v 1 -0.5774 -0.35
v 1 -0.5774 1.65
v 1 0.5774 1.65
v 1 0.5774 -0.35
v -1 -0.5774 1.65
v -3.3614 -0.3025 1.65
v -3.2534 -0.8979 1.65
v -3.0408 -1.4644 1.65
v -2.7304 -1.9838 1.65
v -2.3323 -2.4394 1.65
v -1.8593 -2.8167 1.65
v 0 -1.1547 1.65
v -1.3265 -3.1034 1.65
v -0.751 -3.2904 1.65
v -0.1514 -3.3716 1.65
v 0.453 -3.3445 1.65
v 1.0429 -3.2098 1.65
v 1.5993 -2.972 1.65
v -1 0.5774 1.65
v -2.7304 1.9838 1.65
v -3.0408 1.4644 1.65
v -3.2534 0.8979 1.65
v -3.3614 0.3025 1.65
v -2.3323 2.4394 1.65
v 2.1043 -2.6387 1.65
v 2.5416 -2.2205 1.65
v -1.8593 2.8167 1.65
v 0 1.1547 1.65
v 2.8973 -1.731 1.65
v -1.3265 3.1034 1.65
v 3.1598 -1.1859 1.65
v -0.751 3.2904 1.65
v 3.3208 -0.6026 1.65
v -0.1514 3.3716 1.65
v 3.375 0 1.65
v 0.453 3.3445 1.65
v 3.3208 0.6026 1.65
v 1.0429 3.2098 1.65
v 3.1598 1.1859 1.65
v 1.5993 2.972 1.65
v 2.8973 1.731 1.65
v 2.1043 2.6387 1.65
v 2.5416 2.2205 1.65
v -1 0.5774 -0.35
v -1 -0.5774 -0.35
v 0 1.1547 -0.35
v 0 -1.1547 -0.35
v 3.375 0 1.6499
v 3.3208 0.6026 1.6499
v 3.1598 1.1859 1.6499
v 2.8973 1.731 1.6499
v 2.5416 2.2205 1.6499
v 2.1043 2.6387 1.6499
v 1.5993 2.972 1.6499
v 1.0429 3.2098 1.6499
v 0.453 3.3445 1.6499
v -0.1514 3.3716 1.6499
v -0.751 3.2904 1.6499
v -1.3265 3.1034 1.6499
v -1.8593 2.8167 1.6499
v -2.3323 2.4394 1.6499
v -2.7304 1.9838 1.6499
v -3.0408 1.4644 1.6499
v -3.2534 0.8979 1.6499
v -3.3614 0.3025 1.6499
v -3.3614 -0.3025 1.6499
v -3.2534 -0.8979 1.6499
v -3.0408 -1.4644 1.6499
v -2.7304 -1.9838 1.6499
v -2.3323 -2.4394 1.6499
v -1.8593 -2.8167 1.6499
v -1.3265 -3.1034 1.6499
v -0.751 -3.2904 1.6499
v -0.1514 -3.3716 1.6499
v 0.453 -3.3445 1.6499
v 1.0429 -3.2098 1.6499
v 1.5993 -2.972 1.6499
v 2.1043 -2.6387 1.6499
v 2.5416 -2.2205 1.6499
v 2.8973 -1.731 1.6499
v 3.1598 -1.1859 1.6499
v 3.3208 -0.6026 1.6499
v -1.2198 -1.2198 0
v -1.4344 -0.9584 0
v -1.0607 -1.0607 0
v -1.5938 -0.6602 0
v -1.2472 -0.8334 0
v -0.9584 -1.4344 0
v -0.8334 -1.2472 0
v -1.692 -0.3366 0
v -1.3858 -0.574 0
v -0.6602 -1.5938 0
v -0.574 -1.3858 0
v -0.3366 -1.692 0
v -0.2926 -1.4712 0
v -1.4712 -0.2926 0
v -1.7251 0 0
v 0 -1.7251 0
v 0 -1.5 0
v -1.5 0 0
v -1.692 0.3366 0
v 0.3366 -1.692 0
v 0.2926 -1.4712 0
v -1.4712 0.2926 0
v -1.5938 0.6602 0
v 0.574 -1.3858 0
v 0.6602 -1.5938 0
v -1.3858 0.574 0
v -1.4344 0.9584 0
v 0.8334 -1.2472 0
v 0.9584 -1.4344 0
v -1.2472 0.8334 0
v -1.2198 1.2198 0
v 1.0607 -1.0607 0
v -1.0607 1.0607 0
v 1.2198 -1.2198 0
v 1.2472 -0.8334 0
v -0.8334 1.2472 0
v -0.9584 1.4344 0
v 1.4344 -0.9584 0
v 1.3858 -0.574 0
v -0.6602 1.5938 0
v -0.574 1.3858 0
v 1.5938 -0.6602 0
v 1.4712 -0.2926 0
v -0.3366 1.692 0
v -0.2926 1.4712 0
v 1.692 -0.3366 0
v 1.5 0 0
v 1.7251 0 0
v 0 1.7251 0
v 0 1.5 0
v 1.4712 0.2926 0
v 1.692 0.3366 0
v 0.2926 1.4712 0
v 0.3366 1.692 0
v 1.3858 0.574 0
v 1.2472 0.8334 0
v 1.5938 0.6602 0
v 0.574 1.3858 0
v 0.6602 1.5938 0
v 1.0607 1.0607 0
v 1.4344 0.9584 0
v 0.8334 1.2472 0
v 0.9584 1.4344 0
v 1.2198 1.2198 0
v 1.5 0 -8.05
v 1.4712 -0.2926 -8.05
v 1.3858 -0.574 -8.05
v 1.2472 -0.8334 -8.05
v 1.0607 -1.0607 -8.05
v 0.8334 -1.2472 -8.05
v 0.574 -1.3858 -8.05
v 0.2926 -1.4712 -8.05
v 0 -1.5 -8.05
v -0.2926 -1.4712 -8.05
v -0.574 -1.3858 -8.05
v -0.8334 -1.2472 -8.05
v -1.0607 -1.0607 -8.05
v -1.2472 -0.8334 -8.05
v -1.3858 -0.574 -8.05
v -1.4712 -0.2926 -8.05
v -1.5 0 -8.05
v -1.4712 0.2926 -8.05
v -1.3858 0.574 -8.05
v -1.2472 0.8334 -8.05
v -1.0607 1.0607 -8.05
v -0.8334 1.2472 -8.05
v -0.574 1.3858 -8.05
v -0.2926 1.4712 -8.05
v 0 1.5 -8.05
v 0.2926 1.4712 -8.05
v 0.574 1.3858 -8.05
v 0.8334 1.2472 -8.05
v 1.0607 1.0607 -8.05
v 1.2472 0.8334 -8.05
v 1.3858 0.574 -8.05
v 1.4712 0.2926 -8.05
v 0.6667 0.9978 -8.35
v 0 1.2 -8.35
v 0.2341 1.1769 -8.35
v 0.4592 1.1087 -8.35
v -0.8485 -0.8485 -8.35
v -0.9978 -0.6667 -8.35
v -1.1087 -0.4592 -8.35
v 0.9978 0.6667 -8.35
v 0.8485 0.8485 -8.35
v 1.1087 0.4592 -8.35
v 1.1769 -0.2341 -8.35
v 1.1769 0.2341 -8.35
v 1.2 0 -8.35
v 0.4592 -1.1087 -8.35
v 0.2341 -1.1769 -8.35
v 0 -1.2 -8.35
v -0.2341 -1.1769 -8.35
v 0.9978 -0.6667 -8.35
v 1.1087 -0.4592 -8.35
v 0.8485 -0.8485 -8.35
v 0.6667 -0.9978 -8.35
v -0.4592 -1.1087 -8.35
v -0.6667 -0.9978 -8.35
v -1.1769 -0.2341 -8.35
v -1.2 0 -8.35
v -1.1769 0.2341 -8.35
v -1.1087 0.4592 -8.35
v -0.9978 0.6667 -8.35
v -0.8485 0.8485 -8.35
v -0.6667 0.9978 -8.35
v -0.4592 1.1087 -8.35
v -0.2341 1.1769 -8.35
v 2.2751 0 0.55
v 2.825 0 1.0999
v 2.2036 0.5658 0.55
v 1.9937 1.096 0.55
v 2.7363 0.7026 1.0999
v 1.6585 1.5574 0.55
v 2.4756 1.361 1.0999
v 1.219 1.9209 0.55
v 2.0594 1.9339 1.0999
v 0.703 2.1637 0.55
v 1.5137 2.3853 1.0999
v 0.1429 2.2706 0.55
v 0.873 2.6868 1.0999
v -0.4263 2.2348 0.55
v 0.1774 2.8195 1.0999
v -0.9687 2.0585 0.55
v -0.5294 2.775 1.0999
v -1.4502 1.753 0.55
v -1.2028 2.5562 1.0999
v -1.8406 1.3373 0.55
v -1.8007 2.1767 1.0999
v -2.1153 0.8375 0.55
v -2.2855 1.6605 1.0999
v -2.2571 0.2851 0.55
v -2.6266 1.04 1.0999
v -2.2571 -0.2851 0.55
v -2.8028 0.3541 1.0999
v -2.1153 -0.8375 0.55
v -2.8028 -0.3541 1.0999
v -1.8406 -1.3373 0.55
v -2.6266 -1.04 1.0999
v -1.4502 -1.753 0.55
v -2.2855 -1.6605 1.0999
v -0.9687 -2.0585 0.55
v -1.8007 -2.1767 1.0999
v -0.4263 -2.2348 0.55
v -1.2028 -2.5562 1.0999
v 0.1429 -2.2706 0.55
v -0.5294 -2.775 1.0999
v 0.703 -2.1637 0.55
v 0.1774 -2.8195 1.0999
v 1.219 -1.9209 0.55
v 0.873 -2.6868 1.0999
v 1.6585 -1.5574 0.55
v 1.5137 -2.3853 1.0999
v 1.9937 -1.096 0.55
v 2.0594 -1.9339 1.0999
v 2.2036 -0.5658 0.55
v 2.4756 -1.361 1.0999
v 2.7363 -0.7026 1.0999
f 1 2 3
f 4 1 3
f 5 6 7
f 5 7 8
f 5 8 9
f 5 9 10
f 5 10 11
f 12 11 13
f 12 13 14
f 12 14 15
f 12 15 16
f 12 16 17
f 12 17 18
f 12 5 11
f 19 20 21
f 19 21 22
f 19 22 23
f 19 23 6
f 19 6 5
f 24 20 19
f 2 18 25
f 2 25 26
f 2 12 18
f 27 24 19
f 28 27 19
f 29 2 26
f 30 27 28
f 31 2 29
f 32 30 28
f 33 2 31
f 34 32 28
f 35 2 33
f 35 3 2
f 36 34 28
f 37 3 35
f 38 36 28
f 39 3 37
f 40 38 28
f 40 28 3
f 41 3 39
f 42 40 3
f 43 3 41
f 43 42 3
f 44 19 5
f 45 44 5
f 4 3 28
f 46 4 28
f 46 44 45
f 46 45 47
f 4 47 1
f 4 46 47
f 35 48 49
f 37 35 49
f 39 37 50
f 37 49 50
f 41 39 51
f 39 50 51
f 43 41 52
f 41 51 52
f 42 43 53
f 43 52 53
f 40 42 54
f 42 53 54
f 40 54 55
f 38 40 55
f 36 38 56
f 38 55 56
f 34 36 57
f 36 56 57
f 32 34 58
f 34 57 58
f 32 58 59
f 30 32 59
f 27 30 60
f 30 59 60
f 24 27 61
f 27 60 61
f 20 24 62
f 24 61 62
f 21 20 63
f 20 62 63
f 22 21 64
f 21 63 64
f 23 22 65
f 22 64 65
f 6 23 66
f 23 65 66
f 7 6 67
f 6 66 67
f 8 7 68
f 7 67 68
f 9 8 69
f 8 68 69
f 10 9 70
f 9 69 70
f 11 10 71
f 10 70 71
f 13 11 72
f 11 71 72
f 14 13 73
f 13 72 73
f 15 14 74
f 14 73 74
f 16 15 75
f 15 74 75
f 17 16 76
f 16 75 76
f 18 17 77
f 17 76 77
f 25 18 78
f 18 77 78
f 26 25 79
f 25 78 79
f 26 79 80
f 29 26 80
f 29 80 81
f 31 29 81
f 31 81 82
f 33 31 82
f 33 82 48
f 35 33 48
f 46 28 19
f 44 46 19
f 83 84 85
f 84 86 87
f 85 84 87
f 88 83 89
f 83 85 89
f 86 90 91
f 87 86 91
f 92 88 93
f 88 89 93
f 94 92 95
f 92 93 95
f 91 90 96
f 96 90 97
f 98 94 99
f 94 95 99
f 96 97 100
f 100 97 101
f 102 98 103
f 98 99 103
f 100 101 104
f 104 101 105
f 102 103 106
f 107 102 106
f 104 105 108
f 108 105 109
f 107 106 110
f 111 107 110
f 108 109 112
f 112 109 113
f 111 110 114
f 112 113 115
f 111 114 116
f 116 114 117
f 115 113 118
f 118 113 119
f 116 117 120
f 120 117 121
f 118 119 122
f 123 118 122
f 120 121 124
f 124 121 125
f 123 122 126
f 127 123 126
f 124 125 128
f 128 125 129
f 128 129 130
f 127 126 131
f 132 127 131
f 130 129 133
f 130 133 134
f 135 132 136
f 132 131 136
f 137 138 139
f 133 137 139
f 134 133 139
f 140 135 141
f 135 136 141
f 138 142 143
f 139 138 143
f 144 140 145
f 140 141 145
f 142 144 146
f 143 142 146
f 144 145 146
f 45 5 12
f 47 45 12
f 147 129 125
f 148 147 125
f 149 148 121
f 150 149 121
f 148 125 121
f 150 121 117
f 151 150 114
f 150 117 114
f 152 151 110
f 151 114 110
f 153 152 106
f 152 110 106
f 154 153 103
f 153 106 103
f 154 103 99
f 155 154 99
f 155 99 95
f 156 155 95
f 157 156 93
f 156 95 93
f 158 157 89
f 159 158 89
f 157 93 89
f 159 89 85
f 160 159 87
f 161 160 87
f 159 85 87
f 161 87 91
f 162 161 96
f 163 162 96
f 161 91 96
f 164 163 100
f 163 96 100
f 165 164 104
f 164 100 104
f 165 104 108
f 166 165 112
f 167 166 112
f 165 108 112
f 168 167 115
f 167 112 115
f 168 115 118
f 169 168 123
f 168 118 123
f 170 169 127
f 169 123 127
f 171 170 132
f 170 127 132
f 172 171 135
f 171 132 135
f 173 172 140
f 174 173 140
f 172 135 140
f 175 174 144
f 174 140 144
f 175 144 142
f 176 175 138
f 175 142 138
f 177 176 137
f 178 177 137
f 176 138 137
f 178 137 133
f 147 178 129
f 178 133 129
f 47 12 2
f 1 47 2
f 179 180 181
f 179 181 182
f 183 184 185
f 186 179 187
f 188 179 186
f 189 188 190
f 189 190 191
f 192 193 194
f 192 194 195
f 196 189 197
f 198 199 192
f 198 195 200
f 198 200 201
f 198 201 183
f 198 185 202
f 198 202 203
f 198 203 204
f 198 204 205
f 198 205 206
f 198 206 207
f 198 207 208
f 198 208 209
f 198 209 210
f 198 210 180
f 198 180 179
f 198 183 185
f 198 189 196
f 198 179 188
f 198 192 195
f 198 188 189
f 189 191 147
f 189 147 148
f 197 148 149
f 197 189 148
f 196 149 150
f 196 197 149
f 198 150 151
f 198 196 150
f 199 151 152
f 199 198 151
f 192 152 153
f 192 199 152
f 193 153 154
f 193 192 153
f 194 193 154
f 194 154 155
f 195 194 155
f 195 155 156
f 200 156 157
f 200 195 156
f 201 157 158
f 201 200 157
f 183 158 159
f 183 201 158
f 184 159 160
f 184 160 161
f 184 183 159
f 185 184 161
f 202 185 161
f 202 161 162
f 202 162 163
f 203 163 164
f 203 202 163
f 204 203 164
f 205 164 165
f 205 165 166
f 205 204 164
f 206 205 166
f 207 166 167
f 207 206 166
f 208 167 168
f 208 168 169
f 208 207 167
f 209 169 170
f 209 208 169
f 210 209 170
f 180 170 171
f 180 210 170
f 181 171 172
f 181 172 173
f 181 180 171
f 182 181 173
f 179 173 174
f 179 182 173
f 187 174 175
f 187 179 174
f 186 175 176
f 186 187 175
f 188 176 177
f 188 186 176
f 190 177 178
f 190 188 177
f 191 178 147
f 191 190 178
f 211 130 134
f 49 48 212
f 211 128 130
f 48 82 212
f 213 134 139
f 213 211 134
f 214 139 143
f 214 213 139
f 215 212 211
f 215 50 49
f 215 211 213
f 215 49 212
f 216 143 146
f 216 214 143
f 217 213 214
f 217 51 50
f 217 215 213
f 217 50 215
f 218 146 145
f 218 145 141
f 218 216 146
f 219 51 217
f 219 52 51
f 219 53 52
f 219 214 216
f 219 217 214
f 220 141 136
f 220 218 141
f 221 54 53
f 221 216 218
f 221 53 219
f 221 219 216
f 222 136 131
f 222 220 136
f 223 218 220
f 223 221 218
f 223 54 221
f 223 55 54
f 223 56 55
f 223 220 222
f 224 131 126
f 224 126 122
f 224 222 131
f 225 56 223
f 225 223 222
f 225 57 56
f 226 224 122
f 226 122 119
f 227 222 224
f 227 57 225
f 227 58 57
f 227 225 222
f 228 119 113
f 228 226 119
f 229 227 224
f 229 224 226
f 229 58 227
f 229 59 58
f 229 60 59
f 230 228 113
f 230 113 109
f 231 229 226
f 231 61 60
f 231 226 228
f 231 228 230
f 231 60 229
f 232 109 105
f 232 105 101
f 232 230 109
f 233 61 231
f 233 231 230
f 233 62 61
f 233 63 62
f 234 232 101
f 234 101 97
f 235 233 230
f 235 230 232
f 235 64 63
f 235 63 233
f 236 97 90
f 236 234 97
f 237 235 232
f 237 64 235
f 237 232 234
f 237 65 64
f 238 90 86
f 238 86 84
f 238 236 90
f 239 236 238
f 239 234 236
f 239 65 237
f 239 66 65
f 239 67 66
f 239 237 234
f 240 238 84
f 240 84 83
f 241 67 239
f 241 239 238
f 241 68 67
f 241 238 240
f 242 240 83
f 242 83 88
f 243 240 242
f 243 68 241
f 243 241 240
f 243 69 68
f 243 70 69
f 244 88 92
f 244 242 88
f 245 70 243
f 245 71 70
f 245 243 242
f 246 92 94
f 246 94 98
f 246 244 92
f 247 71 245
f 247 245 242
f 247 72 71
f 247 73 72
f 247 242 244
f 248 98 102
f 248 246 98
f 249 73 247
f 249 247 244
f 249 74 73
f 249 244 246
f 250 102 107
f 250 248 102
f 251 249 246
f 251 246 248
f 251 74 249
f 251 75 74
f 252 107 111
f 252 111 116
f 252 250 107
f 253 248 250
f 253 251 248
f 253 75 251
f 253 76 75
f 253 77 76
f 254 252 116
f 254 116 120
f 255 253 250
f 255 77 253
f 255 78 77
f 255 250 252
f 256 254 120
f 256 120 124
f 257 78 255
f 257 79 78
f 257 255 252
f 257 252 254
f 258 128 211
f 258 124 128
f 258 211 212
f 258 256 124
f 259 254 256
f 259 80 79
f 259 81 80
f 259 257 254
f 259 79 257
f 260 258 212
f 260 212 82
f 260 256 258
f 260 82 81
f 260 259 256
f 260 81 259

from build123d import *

# Parameters (mm, degrees)
SKETCH1_R           = 3.375
BOSS_EXTRUDE1_DEPTH = 1.65
SKETCH2_R           = 1.5
BOSS_EXTRUDE2_DEPTH = 8.35
CHAMFER1_SIZE       = 0.3
CUT_EXTRUDE1_DEPTH  = 2
CHAMFER2_SIZE       = 1.65


with BuildPart() as part:
    # Sketch1 → Boss-Extrude1 (new body)
    with BuildSketch(Plane.XY):
        Circle(SKETCH1_R)
    extrude(amount=BOSS_EXTRUDE1_DEPTH)

    # Sketch2 → Boss-Extrude2 (add)
    with BuildSketch(Plane(origin=(0, 0, 0), x_dir=(-1, 0, 0), z_dir=(0, 0, -1))):
        with Locations(Location((0, 0, 0), (0, 0, 180))):
            Circle(SKETCH2_R)
    extrude(amount=BOSS_EXTRUDE2_DEPTH)

    # Chamfer1
    chamfer1_edges = [part.edges().sort_by_distance(p)[0] for p in [
        (-1.5, 0, -8.35),
    ]]
    chamfer(chamfer1_edges, length=CHAMFER1_SIZE)

    # Sketch3 → Cut-Extrude1 (cut)
    with BuildSketch(Plane.XY.offset(1.65)):
        Polygon((0, 1.154700538), (-1, 0.577350269), (-1, -0.577350269), (0, -1.154700538), (1, -0.577350269), (1, 0.577350269), align=None)
    extrude(amount=-CUT_EXTRUDE1_DEPTH, mode=Mode.SUBTRACT)

    # Chamfer2
    chamfer2_edges = [part.edges().sort_by_distance(p)[0] for p in [
        (-3.375, 0, 0),
    ]]
    chamfer(chamfer2_edges, length=CHAMFER2_SIZE - 0.0001)  # a hair under: the kernel refuses the full size


solid = part.part
